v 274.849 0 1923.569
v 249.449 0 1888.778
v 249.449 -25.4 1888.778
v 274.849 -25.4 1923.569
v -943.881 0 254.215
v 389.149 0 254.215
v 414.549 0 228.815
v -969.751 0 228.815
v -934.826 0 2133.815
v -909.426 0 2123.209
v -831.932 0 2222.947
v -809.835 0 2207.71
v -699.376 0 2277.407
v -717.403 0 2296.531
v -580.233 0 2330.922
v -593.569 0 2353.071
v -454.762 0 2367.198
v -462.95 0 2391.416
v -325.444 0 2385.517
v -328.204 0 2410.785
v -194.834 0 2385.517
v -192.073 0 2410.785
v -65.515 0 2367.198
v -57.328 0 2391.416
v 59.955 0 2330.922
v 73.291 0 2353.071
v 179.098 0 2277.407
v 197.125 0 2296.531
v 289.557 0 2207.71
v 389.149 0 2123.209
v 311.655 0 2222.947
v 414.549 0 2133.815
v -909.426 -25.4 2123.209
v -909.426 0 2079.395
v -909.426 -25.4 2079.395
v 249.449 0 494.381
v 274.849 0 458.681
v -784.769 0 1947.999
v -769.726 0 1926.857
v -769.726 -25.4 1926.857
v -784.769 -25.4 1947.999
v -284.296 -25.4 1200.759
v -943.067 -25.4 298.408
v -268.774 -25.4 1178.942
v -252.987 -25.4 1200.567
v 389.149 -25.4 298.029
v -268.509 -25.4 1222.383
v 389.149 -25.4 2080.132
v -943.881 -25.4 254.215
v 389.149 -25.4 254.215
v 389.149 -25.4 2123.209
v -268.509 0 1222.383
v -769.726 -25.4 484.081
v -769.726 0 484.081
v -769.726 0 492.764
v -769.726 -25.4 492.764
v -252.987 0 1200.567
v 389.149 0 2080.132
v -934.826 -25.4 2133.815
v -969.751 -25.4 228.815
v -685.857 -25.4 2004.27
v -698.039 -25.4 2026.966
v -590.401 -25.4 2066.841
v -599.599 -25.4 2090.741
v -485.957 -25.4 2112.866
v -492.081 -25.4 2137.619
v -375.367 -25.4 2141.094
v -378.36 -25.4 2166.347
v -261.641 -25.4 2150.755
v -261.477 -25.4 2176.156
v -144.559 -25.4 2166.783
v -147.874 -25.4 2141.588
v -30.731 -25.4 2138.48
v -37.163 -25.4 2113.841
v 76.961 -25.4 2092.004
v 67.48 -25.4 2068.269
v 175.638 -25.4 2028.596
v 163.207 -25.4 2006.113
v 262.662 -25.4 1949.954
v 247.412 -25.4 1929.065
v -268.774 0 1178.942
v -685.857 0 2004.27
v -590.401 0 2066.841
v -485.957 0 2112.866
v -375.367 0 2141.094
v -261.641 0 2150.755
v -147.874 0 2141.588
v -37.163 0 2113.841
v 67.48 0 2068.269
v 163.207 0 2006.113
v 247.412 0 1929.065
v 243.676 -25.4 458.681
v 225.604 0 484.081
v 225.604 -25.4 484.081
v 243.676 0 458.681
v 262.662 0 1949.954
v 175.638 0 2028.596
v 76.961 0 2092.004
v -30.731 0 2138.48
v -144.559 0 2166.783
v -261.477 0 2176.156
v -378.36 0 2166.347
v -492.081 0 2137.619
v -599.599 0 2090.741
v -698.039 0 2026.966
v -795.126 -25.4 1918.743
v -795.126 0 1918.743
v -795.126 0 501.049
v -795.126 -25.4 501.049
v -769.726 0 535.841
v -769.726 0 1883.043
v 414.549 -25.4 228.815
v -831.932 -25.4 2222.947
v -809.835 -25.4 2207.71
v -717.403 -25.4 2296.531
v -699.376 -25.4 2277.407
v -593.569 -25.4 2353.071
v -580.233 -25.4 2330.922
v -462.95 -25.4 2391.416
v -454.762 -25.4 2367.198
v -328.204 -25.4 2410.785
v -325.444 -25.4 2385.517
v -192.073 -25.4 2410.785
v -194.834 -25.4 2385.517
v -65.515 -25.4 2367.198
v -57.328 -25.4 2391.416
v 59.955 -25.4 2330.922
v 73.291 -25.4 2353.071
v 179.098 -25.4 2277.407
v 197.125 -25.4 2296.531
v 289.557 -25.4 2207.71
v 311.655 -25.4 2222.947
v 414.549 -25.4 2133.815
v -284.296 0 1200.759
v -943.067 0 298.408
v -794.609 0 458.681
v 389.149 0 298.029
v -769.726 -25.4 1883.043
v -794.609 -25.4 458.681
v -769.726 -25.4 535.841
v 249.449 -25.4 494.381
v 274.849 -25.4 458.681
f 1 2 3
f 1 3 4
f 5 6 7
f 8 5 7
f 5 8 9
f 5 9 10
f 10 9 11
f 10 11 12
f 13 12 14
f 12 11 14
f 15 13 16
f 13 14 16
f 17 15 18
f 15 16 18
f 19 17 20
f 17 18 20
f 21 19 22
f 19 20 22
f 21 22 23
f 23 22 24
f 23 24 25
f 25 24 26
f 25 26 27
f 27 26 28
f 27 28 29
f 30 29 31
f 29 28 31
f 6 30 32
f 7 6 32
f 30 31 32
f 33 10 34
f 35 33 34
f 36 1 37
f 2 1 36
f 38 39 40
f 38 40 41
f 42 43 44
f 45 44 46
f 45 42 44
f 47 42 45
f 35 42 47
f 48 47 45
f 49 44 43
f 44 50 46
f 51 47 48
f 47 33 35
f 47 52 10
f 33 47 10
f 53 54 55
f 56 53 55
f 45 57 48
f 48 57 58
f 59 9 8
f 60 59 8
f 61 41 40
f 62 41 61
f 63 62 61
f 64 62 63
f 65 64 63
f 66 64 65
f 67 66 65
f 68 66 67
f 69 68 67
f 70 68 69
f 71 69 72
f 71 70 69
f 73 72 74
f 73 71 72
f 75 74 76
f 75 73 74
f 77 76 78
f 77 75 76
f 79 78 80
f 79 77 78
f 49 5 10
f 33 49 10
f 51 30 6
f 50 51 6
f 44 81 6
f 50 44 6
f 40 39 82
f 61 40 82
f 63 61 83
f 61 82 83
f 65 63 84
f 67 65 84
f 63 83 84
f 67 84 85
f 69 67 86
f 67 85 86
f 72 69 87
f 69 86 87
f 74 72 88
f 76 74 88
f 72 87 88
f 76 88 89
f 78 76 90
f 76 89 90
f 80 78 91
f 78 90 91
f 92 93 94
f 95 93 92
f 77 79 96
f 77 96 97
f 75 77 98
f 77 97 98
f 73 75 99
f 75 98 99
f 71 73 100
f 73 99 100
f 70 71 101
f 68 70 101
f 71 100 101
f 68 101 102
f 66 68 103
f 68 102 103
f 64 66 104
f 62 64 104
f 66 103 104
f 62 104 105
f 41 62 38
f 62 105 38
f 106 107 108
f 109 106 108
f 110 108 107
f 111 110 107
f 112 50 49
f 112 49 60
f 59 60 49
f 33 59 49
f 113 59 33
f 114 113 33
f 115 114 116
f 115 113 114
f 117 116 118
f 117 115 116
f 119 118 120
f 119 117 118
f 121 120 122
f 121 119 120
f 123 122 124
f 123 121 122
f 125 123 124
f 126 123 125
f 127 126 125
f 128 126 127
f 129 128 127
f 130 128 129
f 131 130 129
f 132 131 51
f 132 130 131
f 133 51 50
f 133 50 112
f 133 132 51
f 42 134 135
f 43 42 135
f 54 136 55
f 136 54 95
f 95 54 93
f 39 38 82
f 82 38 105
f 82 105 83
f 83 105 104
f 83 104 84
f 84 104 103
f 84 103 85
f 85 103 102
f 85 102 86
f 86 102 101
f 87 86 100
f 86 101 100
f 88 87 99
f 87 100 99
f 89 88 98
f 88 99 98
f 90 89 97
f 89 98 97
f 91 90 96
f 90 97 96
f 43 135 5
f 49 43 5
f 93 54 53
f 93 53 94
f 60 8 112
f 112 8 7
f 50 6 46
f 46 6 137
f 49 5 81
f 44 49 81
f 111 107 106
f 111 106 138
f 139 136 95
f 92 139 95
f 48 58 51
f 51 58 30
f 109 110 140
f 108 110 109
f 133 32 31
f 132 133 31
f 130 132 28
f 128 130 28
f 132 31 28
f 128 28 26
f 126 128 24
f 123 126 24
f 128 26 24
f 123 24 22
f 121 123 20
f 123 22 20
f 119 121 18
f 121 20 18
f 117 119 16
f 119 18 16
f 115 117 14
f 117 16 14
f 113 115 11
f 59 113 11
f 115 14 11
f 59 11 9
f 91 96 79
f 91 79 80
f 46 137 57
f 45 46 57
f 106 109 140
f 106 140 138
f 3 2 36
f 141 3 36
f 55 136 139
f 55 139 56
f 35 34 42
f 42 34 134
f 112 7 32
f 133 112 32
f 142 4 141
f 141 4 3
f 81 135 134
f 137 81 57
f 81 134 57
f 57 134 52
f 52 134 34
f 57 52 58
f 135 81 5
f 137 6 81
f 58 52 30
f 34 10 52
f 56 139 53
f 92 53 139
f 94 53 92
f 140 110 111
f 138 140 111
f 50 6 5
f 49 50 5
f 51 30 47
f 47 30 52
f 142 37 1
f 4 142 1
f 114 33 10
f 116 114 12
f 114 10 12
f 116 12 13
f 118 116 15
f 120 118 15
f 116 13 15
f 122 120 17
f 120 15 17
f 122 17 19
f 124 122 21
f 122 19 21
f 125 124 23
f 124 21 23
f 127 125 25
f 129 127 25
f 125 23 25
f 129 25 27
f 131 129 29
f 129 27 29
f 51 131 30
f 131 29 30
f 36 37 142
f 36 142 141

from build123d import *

# Parameters (mm, degrees)
F1_DEPTH = 25.4
F0_W     = 1019.175
F0_H     = 25.4
F3_DEPTH = 25.4


with BuildPart() as f1:
    # F0 (on Front) → F1 (new body)
    with BuildSketch(Plane.XZ):
        with BuildLine():
            Line((-969.7513144493, 228.8154065609), (-934.8263144493, 228.8154065609))
            Line((-934.8263144493, 228.8154065609), (414.5486855507, 228.8154065609))
            Line((414.5486855507, 228.8154065609), (414.5486855507, 2133.8154065609))
            ThreePointArc((414.5486855507, 2133.8154065609), (-260.1388144493, 2413.2154065609), (-934.8263144493, 2133.8154065609))
            Line((-934.8263144493, 2133.8154065609), (-969.7513144493, 228.8154065609))
        make_face()
        with BuildLine():
            Line((389.1486855507, 254.2154065609), (-909.4263144493, 254.2154065609))
            Line((-909.4263144493, 254.2154065609), (-943.8813795302, 254.2154065609))
            Line((-943.8813795302, 254.2154065609), (-909.4263144493, 2123.2085977754))
            ThreePointArc((-909.4263144493, 2123.2085977754), (-260.1388144493, 2387.8154065609), (389.1486855507, 2123.2085977754))
            Line((389.1486855507, 2123.2085977754), (389.1486855507, 254.2154065609))
        make_face(mode=Mode.SUBTRACT)
    extrude(amount=F1_DEPTH)


with BuildPart() as f1b:
    # F0 (on Front) → F1, piece 2 (new body)
    with BuildSketch(Plane.XZ):
        with BuildLine():
            Line((-795.1263144493, 1936.6474755105), (-795.1263144493, 458.6809445003))
            Line((-795.1263144493, 458.6809445003), (-769.7263144493, 458.6809445003))
            Line((-769.7263144493, 458.6809445003), (-769.7263144493, 484.0809445003))
            Line((-769.7263144493, 484.0809445003), (-769.7263144493, 1926.8568102577))
            ThreePointArc((-769.7263144493, 1926.8568102577), (-260.1388144493, 2150.756990214), (249.4486855507, 1926.8568102577))
            Line((249.4486855507, 1926.8568102577), (249.4486855507, 484.0809445003))
            Line((249.4486855507, 484.0809445003), (249.4486855507, 458.6809445003))
            Line((249.4486855507, 458.6809445003), (274.8486855507, 458.6809445003))
            Line((274.8486855507, 458.6809445003), (274.8486855507, 1936.6474755105))
            ThreePointArc((274.8486855507, 1936.6474755105), (-260.1388144493, 2176.156990214), (-795.1263144493, 1936.6474755105))
        make_face()
        with Locations((-260.1388144493, 471.3809445003)):
            Rectangle(F0_W, F0_H)
    extrude(amount=F1_DEPTH)


with BuildPart() as f3:
    # F2 (on Front) → F3 (new body)
    with BuildSketch(Plane.XZ):
        Polygon((-943.066681059, 298.4082093275), (-943.8813795302, 254.2154065609), (-268.7743580134, 1178.942433425), (-284.296025375, 1200.7585188345), align=None)
        Polygon((-284.296025375, 1200.7585188345), (-268.7743580134, 1178.942433425), (-252.9870573974, 1200.567069365), (-268.508724759, 1222.3831547745), align=None)
        Polygon((-252.9870573974, 1200.567069365), (-268.7743580134, 1178.942433425), (389.1486855507, 254.2154065609), (389.1486855507, 298.0294819858), align=None)
        Polygon((-268.508724759, 1222.3831547745), (-252.9870573974, 1200.567069365), (389.1486855507, 2080.1317272551), (389.1486855507, 2123.2085977754), align=None)
        Polygon((-909.4263144493, 2079.3945223506), (-284.296025375, 1200.7585188345), (-268.508724759, 1222.3831547745), (-909.4263144493, 2123.2085977754), align=None)
    extrude(amount=F3_DEPTH)


with BuildPart() as f1b_1:
    add(f1b.part)

    # F4: cut F3
    add(f3.part, mode=Mode.SUBTRACT)


solid = Compound([f1.part, f3.part, f1b_1.part])
